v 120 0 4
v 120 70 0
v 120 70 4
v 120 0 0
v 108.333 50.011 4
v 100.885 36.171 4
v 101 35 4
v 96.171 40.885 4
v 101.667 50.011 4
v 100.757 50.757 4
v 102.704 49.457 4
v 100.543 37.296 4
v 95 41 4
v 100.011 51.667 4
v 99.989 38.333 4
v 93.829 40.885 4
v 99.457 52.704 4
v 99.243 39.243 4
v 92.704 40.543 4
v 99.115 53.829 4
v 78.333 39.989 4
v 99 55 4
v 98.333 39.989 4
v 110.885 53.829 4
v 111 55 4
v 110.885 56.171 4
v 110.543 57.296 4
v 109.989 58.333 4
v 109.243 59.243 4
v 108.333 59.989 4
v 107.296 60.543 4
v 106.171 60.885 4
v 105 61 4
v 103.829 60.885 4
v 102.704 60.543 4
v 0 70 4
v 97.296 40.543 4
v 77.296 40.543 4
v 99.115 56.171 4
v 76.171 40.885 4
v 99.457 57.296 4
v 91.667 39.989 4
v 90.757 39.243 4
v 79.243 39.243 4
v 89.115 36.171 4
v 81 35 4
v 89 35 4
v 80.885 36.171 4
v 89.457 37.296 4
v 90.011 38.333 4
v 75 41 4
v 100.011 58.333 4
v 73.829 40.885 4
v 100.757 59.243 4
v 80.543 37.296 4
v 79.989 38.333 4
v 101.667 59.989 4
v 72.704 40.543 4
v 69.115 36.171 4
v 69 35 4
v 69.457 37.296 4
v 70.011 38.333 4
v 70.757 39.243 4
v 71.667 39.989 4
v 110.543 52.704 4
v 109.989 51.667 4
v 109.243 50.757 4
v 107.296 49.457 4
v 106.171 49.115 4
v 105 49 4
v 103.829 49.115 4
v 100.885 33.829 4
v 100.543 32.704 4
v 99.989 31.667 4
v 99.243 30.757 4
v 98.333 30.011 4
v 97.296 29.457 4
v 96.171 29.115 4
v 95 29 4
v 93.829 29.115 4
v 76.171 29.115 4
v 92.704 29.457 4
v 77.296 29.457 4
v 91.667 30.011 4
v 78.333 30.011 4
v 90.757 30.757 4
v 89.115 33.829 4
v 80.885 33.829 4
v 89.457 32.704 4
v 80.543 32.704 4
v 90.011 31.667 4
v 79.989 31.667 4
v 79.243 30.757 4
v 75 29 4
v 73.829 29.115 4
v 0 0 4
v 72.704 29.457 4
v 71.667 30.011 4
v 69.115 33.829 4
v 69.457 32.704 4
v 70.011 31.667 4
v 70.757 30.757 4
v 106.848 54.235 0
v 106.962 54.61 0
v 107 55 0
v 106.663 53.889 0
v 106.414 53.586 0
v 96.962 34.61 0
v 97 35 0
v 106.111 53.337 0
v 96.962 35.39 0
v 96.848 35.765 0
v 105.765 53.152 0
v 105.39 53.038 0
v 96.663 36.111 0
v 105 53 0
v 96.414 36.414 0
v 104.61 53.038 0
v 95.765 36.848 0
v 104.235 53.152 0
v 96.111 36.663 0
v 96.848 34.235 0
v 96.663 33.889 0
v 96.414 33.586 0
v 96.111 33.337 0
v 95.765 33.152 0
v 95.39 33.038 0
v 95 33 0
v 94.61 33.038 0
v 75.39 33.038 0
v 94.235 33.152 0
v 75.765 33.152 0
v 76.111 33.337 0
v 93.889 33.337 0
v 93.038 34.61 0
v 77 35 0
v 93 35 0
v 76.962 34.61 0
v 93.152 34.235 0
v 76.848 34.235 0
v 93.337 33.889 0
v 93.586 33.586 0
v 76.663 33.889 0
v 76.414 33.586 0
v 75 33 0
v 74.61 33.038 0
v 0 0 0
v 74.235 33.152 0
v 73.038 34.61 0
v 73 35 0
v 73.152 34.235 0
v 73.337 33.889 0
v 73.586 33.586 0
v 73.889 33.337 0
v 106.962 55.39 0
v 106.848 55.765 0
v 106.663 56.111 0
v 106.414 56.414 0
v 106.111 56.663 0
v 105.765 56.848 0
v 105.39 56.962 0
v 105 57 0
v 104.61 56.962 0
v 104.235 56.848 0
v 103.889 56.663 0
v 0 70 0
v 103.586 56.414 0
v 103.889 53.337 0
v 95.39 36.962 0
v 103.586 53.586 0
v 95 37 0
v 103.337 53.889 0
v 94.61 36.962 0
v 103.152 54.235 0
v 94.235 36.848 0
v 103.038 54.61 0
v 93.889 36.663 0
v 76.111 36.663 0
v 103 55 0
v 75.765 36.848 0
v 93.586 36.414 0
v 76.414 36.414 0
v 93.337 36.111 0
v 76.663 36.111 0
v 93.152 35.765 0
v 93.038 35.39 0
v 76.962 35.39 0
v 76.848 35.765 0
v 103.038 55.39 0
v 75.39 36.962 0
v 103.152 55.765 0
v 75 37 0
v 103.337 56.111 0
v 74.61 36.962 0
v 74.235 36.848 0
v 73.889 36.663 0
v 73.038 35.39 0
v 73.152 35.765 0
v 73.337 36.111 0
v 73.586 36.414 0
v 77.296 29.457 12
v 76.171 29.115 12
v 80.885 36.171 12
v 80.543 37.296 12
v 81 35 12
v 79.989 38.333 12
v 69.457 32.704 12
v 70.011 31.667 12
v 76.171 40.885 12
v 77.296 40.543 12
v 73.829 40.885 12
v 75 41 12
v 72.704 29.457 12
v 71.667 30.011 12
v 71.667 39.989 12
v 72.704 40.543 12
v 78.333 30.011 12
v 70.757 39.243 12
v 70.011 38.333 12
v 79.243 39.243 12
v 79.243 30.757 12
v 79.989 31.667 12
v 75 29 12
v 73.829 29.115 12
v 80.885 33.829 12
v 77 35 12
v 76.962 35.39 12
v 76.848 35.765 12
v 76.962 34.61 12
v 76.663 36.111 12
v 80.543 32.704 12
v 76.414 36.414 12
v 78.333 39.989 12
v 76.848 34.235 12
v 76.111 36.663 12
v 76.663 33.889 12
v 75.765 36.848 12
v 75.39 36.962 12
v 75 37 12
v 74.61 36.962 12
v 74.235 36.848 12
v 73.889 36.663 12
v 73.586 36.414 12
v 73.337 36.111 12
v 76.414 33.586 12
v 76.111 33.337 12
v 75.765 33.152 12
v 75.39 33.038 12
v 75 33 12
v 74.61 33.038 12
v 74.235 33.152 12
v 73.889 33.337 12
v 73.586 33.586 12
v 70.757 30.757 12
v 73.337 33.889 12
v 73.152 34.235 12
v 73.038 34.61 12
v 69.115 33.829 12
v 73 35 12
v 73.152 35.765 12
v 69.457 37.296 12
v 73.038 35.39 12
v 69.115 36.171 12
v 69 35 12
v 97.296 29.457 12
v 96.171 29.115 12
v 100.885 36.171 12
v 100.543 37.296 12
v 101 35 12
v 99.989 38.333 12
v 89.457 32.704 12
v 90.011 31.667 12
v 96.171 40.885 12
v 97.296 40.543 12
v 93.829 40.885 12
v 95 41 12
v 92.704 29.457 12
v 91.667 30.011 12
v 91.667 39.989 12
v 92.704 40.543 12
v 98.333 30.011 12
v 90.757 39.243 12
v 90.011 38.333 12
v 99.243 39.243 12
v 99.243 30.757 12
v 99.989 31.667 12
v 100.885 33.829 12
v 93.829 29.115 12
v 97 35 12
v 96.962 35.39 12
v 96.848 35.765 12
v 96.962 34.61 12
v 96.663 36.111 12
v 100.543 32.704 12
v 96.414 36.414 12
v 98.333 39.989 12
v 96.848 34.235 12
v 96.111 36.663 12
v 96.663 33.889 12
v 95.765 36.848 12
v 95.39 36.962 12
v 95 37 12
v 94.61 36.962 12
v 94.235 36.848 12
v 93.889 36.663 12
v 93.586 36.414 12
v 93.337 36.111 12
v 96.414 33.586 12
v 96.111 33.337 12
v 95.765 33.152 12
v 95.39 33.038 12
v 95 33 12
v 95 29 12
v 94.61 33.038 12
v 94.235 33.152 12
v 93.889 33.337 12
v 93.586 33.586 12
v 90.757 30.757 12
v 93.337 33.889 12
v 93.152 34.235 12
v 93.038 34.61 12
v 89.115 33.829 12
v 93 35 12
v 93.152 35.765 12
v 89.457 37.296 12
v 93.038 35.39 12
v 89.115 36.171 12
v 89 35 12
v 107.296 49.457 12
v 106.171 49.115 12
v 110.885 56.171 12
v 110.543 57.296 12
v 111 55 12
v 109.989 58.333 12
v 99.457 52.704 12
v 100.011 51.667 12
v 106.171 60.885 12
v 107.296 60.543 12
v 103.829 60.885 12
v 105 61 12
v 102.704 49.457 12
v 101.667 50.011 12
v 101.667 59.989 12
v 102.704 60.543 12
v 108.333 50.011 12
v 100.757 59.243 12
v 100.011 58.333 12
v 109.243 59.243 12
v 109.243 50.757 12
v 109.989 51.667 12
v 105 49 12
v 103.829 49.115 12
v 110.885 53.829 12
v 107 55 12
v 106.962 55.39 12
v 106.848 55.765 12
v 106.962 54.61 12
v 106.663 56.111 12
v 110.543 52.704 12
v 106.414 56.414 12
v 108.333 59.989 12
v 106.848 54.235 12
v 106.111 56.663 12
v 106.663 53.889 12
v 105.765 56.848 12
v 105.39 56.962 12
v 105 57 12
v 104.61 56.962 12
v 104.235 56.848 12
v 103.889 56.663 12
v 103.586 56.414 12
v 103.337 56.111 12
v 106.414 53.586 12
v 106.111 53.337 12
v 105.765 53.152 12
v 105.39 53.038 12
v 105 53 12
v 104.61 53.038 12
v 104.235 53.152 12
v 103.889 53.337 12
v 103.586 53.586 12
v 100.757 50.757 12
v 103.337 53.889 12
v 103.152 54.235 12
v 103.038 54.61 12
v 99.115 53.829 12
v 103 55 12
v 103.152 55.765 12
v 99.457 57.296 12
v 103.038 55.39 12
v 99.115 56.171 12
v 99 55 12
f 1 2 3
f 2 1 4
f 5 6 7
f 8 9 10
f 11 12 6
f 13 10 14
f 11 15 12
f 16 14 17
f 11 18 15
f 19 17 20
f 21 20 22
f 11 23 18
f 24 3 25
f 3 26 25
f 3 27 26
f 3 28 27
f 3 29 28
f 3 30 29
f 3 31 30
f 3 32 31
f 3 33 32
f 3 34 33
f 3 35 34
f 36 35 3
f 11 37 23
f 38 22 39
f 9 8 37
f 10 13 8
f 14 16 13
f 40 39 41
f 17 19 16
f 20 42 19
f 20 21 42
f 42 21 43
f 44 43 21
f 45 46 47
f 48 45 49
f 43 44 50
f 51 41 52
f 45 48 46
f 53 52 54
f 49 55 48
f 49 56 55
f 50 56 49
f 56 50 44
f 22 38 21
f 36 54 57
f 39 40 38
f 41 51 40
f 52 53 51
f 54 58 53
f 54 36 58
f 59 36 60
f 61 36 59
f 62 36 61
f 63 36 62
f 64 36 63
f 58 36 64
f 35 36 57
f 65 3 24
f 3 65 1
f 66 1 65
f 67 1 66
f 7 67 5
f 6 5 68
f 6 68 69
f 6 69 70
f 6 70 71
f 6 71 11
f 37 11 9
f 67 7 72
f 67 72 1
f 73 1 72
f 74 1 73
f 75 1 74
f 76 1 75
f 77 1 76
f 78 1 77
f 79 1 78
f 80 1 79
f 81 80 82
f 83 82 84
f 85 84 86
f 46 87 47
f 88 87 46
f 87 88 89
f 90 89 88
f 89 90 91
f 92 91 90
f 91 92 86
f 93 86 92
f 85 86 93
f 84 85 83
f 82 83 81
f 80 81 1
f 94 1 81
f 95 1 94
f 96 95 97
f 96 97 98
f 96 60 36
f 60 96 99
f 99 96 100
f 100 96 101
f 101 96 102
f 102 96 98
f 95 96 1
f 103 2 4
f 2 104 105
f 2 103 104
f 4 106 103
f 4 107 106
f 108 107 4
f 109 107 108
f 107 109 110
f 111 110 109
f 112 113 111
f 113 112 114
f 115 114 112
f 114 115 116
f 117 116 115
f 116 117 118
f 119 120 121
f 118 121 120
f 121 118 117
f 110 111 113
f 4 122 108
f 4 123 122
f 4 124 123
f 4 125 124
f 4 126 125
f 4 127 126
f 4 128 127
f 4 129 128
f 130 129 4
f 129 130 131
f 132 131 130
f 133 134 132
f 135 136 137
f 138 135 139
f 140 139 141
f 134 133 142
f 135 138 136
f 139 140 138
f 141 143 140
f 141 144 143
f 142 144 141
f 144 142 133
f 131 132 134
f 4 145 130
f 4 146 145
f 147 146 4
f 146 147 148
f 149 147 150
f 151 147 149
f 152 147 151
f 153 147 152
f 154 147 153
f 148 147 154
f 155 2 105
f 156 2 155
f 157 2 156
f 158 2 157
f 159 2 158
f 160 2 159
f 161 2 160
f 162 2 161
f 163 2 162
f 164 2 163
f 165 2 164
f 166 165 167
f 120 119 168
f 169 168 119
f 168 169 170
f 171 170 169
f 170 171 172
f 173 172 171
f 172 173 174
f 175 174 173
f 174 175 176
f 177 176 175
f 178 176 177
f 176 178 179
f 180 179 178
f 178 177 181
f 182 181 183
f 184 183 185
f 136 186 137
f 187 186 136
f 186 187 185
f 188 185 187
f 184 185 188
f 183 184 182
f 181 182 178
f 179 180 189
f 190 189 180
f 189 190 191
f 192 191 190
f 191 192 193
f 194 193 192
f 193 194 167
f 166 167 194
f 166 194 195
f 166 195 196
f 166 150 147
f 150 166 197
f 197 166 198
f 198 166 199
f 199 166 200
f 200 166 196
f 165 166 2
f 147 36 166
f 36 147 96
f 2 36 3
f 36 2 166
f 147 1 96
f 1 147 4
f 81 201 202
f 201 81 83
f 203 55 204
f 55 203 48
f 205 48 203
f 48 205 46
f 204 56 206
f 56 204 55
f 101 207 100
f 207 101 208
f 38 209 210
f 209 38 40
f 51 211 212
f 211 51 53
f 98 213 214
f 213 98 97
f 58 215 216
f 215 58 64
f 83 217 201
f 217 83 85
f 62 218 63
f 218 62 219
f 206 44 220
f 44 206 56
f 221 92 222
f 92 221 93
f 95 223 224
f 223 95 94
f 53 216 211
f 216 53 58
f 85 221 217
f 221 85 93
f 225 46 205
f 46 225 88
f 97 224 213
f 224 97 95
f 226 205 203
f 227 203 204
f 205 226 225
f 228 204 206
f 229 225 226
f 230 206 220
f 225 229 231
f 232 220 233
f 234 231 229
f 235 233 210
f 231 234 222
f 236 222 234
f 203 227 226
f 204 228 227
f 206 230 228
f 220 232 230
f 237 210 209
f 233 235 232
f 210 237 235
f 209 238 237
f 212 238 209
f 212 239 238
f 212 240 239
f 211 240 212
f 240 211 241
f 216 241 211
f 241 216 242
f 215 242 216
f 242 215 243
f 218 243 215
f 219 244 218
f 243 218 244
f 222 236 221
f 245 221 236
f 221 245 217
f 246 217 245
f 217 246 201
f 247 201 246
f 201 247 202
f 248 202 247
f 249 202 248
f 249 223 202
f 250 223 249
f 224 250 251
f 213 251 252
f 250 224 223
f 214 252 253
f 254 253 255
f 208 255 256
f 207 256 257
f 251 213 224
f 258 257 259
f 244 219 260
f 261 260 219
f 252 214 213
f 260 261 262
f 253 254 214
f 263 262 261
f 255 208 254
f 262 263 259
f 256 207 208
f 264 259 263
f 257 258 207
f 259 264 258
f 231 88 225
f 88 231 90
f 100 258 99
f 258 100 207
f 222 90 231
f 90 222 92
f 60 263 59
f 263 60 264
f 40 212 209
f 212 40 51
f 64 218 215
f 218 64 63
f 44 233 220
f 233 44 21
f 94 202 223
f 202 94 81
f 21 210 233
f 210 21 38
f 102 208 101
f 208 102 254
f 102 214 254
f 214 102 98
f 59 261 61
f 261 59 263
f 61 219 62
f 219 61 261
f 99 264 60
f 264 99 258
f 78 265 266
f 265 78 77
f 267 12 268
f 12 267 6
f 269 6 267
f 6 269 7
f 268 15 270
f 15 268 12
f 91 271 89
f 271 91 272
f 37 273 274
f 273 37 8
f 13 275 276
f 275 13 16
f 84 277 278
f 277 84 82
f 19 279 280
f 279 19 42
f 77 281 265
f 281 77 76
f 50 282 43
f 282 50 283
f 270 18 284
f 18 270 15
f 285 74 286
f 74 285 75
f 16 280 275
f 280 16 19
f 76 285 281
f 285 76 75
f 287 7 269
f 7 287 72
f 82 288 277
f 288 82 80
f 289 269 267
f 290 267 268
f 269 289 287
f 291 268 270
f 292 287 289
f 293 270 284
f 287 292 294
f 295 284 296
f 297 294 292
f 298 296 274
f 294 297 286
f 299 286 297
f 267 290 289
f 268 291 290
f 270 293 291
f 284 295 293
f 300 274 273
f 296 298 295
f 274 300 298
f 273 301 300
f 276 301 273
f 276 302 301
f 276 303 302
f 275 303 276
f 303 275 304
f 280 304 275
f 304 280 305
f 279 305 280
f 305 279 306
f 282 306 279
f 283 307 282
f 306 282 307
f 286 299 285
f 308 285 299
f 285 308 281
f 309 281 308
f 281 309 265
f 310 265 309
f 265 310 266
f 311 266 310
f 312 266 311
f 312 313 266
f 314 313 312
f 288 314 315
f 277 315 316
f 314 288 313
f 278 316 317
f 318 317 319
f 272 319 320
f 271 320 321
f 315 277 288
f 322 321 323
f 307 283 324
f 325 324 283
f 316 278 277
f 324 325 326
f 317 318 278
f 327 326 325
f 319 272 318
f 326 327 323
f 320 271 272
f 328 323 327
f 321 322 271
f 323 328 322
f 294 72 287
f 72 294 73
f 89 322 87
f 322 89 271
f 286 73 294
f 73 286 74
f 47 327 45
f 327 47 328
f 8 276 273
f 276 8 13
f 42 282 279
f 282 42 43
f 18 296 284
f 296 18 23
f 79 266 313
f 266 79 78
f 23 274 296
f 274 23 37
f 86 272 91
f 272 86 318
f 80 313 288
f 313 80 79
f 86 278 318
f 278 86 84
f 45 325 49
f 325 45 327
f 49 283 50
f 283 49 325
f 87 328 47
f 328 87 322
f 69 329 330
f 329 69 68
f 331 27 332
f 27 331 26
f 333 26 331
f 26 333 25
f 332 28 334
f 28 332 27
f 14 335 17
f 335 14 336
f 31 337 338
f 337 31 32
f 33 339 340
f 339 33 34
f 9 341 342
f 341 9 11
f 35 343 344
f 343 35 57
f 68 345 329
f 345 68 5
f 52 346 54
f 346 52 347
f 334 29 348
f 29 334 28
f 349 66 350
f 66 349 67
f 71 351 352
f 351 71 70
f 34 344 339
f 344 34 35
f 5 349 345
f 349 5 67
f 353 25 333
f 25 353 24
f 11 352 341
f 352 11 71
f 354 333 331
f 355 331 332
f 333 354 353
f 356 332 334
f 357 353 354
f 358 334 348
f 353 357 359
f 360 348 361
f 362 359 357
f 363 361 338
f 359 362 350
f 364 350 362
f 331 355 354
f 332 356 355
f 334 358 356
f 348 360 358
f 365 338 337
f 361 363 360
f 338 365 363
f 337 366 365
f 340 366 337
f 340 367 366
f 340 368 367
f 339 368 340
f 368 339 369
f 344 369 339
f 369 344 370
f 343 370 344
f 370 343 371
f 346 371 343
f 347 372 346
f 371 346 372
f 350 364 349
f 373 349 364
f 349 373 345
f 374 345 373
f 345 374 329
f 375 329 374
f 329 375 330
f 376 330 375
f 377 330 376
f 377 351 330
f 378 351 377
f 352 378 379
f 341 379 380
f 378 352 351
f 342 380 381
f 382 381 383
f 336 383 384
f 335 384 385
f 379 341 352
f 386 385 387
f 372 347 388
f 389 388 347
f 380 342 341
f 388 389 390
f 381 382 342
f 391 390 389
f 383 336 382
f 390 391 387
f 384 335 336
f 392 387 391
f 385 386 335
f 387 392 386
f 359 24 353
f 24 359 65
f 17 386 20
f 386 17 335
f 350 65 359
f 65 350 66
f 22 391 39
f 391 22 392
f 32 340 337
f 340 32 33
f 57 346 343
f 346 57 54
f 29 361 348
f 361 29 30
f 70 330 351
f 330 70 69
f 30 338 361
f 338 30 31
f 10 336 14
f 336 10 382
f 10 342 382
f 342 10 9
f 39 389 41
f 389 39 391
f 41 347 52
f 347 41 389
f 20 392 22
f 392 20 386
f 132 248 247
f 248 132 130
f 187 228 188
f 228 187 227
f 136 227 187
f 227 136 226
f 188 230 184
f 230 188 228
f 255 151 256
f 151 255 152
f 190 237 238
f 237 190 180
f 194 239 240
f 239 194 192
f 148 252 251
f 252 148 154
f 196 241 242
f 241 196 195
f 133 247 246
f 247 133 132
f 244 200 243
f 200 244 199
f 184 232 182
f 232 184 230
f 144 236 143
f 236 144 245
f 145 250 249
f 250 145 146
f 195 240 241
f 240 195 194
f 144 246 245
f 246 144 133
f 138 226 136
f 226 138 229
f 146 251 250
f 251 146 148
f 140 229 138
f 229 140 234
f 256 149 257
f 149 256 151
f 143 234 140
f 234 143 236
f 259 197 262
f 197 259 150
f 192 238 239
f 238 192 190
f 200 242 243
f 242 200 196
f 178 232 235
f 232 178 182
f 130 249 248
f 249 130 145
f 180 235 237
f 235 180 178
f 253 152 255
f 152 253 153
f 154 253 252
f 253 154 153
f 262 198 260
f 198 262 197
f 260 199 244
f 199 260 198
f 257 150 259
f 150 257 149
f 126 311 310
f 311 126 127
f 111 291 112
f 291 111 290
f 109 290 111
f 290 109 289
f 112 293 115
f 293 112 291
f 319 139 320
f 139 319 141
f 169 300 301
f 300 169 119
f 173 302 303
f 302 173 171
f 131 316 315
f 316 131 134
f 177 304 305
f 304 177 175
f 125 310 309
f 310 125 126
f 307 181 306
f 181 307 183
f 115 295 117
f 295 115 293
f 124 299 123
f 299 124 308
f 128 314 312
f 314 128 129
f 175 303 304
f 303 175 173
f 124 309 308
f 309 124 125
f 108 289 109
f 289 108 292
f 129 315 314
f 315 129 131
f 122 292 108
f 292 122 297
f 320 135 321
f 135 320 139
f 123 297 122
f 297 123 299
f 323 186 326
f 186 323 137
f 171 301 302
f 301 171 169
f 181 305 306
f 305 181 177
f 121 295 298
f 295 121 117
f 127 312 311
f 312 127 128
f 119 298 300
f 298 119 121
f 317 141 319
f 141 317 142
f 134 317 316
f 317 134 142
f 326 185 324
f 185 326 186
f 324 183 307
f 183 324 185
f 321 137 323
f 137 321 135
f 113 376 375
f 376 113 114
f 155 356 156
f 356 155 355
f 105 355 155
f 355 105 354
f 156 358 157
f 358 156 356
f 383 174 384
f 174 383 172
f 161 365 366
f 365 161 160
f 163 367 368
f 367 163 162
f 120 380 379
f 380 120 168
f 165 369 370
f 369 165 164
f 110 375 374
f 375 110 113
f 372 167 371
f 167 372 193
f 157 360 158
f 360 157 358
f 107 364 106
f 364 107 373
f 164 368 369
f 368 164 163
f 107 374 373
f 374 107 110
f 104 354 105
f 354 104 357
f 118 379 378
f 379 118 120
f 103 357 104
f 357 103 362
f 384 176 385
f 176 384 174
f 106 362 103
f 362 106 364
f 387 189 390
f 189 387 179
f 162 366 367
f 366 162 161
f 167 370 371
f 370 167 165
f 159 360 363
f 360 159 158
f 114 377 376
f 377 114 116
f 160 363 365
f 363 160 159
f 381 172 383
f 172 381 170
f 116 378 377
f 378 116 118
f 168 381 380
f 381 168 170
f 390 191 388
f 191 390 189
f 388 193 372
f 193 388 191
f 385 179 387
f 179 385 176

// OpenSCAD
$fn = 32;

// ----------------------------------------------------------------------
// Boss field: plate with bosses at given coordinates
// ----------------------------------------------------------------------

// --- parameters (mm) ---
plate_l = 120;            // plate length, X
plate_w = 70;             // plate width, Y
plate_t = 4;              // plate thickness, Z
boss_d = 12;              // boss diameter
boss_h = 8;               // boss height above the plate
bore_d = 4;               // boss bore

total_h = plate_t + boss_h;  // overall height

difference() {
  union() {
    cube([plate_l, plate_w, plate_t]);
    translate([75, 35, plate_t]) cylinder(h = boss_h, d = boss_d);
    translate([95, 35, plate_t]) cylinder(h = boss_h, d = boss_d);
    translate([105, 55, plate_t]) cylinder(h = boss_h, d = boss_d);
  }
  translate([75, 35, -1]) cylinder(h = total_h + 2, d = bore_d);
  translate([95, 35, -1]) cylinder(h = total_h + 2, d = bore_d);
  translate([105, 55, -1]) cylinder(h = total_h + 2, d = bore_d);
}
